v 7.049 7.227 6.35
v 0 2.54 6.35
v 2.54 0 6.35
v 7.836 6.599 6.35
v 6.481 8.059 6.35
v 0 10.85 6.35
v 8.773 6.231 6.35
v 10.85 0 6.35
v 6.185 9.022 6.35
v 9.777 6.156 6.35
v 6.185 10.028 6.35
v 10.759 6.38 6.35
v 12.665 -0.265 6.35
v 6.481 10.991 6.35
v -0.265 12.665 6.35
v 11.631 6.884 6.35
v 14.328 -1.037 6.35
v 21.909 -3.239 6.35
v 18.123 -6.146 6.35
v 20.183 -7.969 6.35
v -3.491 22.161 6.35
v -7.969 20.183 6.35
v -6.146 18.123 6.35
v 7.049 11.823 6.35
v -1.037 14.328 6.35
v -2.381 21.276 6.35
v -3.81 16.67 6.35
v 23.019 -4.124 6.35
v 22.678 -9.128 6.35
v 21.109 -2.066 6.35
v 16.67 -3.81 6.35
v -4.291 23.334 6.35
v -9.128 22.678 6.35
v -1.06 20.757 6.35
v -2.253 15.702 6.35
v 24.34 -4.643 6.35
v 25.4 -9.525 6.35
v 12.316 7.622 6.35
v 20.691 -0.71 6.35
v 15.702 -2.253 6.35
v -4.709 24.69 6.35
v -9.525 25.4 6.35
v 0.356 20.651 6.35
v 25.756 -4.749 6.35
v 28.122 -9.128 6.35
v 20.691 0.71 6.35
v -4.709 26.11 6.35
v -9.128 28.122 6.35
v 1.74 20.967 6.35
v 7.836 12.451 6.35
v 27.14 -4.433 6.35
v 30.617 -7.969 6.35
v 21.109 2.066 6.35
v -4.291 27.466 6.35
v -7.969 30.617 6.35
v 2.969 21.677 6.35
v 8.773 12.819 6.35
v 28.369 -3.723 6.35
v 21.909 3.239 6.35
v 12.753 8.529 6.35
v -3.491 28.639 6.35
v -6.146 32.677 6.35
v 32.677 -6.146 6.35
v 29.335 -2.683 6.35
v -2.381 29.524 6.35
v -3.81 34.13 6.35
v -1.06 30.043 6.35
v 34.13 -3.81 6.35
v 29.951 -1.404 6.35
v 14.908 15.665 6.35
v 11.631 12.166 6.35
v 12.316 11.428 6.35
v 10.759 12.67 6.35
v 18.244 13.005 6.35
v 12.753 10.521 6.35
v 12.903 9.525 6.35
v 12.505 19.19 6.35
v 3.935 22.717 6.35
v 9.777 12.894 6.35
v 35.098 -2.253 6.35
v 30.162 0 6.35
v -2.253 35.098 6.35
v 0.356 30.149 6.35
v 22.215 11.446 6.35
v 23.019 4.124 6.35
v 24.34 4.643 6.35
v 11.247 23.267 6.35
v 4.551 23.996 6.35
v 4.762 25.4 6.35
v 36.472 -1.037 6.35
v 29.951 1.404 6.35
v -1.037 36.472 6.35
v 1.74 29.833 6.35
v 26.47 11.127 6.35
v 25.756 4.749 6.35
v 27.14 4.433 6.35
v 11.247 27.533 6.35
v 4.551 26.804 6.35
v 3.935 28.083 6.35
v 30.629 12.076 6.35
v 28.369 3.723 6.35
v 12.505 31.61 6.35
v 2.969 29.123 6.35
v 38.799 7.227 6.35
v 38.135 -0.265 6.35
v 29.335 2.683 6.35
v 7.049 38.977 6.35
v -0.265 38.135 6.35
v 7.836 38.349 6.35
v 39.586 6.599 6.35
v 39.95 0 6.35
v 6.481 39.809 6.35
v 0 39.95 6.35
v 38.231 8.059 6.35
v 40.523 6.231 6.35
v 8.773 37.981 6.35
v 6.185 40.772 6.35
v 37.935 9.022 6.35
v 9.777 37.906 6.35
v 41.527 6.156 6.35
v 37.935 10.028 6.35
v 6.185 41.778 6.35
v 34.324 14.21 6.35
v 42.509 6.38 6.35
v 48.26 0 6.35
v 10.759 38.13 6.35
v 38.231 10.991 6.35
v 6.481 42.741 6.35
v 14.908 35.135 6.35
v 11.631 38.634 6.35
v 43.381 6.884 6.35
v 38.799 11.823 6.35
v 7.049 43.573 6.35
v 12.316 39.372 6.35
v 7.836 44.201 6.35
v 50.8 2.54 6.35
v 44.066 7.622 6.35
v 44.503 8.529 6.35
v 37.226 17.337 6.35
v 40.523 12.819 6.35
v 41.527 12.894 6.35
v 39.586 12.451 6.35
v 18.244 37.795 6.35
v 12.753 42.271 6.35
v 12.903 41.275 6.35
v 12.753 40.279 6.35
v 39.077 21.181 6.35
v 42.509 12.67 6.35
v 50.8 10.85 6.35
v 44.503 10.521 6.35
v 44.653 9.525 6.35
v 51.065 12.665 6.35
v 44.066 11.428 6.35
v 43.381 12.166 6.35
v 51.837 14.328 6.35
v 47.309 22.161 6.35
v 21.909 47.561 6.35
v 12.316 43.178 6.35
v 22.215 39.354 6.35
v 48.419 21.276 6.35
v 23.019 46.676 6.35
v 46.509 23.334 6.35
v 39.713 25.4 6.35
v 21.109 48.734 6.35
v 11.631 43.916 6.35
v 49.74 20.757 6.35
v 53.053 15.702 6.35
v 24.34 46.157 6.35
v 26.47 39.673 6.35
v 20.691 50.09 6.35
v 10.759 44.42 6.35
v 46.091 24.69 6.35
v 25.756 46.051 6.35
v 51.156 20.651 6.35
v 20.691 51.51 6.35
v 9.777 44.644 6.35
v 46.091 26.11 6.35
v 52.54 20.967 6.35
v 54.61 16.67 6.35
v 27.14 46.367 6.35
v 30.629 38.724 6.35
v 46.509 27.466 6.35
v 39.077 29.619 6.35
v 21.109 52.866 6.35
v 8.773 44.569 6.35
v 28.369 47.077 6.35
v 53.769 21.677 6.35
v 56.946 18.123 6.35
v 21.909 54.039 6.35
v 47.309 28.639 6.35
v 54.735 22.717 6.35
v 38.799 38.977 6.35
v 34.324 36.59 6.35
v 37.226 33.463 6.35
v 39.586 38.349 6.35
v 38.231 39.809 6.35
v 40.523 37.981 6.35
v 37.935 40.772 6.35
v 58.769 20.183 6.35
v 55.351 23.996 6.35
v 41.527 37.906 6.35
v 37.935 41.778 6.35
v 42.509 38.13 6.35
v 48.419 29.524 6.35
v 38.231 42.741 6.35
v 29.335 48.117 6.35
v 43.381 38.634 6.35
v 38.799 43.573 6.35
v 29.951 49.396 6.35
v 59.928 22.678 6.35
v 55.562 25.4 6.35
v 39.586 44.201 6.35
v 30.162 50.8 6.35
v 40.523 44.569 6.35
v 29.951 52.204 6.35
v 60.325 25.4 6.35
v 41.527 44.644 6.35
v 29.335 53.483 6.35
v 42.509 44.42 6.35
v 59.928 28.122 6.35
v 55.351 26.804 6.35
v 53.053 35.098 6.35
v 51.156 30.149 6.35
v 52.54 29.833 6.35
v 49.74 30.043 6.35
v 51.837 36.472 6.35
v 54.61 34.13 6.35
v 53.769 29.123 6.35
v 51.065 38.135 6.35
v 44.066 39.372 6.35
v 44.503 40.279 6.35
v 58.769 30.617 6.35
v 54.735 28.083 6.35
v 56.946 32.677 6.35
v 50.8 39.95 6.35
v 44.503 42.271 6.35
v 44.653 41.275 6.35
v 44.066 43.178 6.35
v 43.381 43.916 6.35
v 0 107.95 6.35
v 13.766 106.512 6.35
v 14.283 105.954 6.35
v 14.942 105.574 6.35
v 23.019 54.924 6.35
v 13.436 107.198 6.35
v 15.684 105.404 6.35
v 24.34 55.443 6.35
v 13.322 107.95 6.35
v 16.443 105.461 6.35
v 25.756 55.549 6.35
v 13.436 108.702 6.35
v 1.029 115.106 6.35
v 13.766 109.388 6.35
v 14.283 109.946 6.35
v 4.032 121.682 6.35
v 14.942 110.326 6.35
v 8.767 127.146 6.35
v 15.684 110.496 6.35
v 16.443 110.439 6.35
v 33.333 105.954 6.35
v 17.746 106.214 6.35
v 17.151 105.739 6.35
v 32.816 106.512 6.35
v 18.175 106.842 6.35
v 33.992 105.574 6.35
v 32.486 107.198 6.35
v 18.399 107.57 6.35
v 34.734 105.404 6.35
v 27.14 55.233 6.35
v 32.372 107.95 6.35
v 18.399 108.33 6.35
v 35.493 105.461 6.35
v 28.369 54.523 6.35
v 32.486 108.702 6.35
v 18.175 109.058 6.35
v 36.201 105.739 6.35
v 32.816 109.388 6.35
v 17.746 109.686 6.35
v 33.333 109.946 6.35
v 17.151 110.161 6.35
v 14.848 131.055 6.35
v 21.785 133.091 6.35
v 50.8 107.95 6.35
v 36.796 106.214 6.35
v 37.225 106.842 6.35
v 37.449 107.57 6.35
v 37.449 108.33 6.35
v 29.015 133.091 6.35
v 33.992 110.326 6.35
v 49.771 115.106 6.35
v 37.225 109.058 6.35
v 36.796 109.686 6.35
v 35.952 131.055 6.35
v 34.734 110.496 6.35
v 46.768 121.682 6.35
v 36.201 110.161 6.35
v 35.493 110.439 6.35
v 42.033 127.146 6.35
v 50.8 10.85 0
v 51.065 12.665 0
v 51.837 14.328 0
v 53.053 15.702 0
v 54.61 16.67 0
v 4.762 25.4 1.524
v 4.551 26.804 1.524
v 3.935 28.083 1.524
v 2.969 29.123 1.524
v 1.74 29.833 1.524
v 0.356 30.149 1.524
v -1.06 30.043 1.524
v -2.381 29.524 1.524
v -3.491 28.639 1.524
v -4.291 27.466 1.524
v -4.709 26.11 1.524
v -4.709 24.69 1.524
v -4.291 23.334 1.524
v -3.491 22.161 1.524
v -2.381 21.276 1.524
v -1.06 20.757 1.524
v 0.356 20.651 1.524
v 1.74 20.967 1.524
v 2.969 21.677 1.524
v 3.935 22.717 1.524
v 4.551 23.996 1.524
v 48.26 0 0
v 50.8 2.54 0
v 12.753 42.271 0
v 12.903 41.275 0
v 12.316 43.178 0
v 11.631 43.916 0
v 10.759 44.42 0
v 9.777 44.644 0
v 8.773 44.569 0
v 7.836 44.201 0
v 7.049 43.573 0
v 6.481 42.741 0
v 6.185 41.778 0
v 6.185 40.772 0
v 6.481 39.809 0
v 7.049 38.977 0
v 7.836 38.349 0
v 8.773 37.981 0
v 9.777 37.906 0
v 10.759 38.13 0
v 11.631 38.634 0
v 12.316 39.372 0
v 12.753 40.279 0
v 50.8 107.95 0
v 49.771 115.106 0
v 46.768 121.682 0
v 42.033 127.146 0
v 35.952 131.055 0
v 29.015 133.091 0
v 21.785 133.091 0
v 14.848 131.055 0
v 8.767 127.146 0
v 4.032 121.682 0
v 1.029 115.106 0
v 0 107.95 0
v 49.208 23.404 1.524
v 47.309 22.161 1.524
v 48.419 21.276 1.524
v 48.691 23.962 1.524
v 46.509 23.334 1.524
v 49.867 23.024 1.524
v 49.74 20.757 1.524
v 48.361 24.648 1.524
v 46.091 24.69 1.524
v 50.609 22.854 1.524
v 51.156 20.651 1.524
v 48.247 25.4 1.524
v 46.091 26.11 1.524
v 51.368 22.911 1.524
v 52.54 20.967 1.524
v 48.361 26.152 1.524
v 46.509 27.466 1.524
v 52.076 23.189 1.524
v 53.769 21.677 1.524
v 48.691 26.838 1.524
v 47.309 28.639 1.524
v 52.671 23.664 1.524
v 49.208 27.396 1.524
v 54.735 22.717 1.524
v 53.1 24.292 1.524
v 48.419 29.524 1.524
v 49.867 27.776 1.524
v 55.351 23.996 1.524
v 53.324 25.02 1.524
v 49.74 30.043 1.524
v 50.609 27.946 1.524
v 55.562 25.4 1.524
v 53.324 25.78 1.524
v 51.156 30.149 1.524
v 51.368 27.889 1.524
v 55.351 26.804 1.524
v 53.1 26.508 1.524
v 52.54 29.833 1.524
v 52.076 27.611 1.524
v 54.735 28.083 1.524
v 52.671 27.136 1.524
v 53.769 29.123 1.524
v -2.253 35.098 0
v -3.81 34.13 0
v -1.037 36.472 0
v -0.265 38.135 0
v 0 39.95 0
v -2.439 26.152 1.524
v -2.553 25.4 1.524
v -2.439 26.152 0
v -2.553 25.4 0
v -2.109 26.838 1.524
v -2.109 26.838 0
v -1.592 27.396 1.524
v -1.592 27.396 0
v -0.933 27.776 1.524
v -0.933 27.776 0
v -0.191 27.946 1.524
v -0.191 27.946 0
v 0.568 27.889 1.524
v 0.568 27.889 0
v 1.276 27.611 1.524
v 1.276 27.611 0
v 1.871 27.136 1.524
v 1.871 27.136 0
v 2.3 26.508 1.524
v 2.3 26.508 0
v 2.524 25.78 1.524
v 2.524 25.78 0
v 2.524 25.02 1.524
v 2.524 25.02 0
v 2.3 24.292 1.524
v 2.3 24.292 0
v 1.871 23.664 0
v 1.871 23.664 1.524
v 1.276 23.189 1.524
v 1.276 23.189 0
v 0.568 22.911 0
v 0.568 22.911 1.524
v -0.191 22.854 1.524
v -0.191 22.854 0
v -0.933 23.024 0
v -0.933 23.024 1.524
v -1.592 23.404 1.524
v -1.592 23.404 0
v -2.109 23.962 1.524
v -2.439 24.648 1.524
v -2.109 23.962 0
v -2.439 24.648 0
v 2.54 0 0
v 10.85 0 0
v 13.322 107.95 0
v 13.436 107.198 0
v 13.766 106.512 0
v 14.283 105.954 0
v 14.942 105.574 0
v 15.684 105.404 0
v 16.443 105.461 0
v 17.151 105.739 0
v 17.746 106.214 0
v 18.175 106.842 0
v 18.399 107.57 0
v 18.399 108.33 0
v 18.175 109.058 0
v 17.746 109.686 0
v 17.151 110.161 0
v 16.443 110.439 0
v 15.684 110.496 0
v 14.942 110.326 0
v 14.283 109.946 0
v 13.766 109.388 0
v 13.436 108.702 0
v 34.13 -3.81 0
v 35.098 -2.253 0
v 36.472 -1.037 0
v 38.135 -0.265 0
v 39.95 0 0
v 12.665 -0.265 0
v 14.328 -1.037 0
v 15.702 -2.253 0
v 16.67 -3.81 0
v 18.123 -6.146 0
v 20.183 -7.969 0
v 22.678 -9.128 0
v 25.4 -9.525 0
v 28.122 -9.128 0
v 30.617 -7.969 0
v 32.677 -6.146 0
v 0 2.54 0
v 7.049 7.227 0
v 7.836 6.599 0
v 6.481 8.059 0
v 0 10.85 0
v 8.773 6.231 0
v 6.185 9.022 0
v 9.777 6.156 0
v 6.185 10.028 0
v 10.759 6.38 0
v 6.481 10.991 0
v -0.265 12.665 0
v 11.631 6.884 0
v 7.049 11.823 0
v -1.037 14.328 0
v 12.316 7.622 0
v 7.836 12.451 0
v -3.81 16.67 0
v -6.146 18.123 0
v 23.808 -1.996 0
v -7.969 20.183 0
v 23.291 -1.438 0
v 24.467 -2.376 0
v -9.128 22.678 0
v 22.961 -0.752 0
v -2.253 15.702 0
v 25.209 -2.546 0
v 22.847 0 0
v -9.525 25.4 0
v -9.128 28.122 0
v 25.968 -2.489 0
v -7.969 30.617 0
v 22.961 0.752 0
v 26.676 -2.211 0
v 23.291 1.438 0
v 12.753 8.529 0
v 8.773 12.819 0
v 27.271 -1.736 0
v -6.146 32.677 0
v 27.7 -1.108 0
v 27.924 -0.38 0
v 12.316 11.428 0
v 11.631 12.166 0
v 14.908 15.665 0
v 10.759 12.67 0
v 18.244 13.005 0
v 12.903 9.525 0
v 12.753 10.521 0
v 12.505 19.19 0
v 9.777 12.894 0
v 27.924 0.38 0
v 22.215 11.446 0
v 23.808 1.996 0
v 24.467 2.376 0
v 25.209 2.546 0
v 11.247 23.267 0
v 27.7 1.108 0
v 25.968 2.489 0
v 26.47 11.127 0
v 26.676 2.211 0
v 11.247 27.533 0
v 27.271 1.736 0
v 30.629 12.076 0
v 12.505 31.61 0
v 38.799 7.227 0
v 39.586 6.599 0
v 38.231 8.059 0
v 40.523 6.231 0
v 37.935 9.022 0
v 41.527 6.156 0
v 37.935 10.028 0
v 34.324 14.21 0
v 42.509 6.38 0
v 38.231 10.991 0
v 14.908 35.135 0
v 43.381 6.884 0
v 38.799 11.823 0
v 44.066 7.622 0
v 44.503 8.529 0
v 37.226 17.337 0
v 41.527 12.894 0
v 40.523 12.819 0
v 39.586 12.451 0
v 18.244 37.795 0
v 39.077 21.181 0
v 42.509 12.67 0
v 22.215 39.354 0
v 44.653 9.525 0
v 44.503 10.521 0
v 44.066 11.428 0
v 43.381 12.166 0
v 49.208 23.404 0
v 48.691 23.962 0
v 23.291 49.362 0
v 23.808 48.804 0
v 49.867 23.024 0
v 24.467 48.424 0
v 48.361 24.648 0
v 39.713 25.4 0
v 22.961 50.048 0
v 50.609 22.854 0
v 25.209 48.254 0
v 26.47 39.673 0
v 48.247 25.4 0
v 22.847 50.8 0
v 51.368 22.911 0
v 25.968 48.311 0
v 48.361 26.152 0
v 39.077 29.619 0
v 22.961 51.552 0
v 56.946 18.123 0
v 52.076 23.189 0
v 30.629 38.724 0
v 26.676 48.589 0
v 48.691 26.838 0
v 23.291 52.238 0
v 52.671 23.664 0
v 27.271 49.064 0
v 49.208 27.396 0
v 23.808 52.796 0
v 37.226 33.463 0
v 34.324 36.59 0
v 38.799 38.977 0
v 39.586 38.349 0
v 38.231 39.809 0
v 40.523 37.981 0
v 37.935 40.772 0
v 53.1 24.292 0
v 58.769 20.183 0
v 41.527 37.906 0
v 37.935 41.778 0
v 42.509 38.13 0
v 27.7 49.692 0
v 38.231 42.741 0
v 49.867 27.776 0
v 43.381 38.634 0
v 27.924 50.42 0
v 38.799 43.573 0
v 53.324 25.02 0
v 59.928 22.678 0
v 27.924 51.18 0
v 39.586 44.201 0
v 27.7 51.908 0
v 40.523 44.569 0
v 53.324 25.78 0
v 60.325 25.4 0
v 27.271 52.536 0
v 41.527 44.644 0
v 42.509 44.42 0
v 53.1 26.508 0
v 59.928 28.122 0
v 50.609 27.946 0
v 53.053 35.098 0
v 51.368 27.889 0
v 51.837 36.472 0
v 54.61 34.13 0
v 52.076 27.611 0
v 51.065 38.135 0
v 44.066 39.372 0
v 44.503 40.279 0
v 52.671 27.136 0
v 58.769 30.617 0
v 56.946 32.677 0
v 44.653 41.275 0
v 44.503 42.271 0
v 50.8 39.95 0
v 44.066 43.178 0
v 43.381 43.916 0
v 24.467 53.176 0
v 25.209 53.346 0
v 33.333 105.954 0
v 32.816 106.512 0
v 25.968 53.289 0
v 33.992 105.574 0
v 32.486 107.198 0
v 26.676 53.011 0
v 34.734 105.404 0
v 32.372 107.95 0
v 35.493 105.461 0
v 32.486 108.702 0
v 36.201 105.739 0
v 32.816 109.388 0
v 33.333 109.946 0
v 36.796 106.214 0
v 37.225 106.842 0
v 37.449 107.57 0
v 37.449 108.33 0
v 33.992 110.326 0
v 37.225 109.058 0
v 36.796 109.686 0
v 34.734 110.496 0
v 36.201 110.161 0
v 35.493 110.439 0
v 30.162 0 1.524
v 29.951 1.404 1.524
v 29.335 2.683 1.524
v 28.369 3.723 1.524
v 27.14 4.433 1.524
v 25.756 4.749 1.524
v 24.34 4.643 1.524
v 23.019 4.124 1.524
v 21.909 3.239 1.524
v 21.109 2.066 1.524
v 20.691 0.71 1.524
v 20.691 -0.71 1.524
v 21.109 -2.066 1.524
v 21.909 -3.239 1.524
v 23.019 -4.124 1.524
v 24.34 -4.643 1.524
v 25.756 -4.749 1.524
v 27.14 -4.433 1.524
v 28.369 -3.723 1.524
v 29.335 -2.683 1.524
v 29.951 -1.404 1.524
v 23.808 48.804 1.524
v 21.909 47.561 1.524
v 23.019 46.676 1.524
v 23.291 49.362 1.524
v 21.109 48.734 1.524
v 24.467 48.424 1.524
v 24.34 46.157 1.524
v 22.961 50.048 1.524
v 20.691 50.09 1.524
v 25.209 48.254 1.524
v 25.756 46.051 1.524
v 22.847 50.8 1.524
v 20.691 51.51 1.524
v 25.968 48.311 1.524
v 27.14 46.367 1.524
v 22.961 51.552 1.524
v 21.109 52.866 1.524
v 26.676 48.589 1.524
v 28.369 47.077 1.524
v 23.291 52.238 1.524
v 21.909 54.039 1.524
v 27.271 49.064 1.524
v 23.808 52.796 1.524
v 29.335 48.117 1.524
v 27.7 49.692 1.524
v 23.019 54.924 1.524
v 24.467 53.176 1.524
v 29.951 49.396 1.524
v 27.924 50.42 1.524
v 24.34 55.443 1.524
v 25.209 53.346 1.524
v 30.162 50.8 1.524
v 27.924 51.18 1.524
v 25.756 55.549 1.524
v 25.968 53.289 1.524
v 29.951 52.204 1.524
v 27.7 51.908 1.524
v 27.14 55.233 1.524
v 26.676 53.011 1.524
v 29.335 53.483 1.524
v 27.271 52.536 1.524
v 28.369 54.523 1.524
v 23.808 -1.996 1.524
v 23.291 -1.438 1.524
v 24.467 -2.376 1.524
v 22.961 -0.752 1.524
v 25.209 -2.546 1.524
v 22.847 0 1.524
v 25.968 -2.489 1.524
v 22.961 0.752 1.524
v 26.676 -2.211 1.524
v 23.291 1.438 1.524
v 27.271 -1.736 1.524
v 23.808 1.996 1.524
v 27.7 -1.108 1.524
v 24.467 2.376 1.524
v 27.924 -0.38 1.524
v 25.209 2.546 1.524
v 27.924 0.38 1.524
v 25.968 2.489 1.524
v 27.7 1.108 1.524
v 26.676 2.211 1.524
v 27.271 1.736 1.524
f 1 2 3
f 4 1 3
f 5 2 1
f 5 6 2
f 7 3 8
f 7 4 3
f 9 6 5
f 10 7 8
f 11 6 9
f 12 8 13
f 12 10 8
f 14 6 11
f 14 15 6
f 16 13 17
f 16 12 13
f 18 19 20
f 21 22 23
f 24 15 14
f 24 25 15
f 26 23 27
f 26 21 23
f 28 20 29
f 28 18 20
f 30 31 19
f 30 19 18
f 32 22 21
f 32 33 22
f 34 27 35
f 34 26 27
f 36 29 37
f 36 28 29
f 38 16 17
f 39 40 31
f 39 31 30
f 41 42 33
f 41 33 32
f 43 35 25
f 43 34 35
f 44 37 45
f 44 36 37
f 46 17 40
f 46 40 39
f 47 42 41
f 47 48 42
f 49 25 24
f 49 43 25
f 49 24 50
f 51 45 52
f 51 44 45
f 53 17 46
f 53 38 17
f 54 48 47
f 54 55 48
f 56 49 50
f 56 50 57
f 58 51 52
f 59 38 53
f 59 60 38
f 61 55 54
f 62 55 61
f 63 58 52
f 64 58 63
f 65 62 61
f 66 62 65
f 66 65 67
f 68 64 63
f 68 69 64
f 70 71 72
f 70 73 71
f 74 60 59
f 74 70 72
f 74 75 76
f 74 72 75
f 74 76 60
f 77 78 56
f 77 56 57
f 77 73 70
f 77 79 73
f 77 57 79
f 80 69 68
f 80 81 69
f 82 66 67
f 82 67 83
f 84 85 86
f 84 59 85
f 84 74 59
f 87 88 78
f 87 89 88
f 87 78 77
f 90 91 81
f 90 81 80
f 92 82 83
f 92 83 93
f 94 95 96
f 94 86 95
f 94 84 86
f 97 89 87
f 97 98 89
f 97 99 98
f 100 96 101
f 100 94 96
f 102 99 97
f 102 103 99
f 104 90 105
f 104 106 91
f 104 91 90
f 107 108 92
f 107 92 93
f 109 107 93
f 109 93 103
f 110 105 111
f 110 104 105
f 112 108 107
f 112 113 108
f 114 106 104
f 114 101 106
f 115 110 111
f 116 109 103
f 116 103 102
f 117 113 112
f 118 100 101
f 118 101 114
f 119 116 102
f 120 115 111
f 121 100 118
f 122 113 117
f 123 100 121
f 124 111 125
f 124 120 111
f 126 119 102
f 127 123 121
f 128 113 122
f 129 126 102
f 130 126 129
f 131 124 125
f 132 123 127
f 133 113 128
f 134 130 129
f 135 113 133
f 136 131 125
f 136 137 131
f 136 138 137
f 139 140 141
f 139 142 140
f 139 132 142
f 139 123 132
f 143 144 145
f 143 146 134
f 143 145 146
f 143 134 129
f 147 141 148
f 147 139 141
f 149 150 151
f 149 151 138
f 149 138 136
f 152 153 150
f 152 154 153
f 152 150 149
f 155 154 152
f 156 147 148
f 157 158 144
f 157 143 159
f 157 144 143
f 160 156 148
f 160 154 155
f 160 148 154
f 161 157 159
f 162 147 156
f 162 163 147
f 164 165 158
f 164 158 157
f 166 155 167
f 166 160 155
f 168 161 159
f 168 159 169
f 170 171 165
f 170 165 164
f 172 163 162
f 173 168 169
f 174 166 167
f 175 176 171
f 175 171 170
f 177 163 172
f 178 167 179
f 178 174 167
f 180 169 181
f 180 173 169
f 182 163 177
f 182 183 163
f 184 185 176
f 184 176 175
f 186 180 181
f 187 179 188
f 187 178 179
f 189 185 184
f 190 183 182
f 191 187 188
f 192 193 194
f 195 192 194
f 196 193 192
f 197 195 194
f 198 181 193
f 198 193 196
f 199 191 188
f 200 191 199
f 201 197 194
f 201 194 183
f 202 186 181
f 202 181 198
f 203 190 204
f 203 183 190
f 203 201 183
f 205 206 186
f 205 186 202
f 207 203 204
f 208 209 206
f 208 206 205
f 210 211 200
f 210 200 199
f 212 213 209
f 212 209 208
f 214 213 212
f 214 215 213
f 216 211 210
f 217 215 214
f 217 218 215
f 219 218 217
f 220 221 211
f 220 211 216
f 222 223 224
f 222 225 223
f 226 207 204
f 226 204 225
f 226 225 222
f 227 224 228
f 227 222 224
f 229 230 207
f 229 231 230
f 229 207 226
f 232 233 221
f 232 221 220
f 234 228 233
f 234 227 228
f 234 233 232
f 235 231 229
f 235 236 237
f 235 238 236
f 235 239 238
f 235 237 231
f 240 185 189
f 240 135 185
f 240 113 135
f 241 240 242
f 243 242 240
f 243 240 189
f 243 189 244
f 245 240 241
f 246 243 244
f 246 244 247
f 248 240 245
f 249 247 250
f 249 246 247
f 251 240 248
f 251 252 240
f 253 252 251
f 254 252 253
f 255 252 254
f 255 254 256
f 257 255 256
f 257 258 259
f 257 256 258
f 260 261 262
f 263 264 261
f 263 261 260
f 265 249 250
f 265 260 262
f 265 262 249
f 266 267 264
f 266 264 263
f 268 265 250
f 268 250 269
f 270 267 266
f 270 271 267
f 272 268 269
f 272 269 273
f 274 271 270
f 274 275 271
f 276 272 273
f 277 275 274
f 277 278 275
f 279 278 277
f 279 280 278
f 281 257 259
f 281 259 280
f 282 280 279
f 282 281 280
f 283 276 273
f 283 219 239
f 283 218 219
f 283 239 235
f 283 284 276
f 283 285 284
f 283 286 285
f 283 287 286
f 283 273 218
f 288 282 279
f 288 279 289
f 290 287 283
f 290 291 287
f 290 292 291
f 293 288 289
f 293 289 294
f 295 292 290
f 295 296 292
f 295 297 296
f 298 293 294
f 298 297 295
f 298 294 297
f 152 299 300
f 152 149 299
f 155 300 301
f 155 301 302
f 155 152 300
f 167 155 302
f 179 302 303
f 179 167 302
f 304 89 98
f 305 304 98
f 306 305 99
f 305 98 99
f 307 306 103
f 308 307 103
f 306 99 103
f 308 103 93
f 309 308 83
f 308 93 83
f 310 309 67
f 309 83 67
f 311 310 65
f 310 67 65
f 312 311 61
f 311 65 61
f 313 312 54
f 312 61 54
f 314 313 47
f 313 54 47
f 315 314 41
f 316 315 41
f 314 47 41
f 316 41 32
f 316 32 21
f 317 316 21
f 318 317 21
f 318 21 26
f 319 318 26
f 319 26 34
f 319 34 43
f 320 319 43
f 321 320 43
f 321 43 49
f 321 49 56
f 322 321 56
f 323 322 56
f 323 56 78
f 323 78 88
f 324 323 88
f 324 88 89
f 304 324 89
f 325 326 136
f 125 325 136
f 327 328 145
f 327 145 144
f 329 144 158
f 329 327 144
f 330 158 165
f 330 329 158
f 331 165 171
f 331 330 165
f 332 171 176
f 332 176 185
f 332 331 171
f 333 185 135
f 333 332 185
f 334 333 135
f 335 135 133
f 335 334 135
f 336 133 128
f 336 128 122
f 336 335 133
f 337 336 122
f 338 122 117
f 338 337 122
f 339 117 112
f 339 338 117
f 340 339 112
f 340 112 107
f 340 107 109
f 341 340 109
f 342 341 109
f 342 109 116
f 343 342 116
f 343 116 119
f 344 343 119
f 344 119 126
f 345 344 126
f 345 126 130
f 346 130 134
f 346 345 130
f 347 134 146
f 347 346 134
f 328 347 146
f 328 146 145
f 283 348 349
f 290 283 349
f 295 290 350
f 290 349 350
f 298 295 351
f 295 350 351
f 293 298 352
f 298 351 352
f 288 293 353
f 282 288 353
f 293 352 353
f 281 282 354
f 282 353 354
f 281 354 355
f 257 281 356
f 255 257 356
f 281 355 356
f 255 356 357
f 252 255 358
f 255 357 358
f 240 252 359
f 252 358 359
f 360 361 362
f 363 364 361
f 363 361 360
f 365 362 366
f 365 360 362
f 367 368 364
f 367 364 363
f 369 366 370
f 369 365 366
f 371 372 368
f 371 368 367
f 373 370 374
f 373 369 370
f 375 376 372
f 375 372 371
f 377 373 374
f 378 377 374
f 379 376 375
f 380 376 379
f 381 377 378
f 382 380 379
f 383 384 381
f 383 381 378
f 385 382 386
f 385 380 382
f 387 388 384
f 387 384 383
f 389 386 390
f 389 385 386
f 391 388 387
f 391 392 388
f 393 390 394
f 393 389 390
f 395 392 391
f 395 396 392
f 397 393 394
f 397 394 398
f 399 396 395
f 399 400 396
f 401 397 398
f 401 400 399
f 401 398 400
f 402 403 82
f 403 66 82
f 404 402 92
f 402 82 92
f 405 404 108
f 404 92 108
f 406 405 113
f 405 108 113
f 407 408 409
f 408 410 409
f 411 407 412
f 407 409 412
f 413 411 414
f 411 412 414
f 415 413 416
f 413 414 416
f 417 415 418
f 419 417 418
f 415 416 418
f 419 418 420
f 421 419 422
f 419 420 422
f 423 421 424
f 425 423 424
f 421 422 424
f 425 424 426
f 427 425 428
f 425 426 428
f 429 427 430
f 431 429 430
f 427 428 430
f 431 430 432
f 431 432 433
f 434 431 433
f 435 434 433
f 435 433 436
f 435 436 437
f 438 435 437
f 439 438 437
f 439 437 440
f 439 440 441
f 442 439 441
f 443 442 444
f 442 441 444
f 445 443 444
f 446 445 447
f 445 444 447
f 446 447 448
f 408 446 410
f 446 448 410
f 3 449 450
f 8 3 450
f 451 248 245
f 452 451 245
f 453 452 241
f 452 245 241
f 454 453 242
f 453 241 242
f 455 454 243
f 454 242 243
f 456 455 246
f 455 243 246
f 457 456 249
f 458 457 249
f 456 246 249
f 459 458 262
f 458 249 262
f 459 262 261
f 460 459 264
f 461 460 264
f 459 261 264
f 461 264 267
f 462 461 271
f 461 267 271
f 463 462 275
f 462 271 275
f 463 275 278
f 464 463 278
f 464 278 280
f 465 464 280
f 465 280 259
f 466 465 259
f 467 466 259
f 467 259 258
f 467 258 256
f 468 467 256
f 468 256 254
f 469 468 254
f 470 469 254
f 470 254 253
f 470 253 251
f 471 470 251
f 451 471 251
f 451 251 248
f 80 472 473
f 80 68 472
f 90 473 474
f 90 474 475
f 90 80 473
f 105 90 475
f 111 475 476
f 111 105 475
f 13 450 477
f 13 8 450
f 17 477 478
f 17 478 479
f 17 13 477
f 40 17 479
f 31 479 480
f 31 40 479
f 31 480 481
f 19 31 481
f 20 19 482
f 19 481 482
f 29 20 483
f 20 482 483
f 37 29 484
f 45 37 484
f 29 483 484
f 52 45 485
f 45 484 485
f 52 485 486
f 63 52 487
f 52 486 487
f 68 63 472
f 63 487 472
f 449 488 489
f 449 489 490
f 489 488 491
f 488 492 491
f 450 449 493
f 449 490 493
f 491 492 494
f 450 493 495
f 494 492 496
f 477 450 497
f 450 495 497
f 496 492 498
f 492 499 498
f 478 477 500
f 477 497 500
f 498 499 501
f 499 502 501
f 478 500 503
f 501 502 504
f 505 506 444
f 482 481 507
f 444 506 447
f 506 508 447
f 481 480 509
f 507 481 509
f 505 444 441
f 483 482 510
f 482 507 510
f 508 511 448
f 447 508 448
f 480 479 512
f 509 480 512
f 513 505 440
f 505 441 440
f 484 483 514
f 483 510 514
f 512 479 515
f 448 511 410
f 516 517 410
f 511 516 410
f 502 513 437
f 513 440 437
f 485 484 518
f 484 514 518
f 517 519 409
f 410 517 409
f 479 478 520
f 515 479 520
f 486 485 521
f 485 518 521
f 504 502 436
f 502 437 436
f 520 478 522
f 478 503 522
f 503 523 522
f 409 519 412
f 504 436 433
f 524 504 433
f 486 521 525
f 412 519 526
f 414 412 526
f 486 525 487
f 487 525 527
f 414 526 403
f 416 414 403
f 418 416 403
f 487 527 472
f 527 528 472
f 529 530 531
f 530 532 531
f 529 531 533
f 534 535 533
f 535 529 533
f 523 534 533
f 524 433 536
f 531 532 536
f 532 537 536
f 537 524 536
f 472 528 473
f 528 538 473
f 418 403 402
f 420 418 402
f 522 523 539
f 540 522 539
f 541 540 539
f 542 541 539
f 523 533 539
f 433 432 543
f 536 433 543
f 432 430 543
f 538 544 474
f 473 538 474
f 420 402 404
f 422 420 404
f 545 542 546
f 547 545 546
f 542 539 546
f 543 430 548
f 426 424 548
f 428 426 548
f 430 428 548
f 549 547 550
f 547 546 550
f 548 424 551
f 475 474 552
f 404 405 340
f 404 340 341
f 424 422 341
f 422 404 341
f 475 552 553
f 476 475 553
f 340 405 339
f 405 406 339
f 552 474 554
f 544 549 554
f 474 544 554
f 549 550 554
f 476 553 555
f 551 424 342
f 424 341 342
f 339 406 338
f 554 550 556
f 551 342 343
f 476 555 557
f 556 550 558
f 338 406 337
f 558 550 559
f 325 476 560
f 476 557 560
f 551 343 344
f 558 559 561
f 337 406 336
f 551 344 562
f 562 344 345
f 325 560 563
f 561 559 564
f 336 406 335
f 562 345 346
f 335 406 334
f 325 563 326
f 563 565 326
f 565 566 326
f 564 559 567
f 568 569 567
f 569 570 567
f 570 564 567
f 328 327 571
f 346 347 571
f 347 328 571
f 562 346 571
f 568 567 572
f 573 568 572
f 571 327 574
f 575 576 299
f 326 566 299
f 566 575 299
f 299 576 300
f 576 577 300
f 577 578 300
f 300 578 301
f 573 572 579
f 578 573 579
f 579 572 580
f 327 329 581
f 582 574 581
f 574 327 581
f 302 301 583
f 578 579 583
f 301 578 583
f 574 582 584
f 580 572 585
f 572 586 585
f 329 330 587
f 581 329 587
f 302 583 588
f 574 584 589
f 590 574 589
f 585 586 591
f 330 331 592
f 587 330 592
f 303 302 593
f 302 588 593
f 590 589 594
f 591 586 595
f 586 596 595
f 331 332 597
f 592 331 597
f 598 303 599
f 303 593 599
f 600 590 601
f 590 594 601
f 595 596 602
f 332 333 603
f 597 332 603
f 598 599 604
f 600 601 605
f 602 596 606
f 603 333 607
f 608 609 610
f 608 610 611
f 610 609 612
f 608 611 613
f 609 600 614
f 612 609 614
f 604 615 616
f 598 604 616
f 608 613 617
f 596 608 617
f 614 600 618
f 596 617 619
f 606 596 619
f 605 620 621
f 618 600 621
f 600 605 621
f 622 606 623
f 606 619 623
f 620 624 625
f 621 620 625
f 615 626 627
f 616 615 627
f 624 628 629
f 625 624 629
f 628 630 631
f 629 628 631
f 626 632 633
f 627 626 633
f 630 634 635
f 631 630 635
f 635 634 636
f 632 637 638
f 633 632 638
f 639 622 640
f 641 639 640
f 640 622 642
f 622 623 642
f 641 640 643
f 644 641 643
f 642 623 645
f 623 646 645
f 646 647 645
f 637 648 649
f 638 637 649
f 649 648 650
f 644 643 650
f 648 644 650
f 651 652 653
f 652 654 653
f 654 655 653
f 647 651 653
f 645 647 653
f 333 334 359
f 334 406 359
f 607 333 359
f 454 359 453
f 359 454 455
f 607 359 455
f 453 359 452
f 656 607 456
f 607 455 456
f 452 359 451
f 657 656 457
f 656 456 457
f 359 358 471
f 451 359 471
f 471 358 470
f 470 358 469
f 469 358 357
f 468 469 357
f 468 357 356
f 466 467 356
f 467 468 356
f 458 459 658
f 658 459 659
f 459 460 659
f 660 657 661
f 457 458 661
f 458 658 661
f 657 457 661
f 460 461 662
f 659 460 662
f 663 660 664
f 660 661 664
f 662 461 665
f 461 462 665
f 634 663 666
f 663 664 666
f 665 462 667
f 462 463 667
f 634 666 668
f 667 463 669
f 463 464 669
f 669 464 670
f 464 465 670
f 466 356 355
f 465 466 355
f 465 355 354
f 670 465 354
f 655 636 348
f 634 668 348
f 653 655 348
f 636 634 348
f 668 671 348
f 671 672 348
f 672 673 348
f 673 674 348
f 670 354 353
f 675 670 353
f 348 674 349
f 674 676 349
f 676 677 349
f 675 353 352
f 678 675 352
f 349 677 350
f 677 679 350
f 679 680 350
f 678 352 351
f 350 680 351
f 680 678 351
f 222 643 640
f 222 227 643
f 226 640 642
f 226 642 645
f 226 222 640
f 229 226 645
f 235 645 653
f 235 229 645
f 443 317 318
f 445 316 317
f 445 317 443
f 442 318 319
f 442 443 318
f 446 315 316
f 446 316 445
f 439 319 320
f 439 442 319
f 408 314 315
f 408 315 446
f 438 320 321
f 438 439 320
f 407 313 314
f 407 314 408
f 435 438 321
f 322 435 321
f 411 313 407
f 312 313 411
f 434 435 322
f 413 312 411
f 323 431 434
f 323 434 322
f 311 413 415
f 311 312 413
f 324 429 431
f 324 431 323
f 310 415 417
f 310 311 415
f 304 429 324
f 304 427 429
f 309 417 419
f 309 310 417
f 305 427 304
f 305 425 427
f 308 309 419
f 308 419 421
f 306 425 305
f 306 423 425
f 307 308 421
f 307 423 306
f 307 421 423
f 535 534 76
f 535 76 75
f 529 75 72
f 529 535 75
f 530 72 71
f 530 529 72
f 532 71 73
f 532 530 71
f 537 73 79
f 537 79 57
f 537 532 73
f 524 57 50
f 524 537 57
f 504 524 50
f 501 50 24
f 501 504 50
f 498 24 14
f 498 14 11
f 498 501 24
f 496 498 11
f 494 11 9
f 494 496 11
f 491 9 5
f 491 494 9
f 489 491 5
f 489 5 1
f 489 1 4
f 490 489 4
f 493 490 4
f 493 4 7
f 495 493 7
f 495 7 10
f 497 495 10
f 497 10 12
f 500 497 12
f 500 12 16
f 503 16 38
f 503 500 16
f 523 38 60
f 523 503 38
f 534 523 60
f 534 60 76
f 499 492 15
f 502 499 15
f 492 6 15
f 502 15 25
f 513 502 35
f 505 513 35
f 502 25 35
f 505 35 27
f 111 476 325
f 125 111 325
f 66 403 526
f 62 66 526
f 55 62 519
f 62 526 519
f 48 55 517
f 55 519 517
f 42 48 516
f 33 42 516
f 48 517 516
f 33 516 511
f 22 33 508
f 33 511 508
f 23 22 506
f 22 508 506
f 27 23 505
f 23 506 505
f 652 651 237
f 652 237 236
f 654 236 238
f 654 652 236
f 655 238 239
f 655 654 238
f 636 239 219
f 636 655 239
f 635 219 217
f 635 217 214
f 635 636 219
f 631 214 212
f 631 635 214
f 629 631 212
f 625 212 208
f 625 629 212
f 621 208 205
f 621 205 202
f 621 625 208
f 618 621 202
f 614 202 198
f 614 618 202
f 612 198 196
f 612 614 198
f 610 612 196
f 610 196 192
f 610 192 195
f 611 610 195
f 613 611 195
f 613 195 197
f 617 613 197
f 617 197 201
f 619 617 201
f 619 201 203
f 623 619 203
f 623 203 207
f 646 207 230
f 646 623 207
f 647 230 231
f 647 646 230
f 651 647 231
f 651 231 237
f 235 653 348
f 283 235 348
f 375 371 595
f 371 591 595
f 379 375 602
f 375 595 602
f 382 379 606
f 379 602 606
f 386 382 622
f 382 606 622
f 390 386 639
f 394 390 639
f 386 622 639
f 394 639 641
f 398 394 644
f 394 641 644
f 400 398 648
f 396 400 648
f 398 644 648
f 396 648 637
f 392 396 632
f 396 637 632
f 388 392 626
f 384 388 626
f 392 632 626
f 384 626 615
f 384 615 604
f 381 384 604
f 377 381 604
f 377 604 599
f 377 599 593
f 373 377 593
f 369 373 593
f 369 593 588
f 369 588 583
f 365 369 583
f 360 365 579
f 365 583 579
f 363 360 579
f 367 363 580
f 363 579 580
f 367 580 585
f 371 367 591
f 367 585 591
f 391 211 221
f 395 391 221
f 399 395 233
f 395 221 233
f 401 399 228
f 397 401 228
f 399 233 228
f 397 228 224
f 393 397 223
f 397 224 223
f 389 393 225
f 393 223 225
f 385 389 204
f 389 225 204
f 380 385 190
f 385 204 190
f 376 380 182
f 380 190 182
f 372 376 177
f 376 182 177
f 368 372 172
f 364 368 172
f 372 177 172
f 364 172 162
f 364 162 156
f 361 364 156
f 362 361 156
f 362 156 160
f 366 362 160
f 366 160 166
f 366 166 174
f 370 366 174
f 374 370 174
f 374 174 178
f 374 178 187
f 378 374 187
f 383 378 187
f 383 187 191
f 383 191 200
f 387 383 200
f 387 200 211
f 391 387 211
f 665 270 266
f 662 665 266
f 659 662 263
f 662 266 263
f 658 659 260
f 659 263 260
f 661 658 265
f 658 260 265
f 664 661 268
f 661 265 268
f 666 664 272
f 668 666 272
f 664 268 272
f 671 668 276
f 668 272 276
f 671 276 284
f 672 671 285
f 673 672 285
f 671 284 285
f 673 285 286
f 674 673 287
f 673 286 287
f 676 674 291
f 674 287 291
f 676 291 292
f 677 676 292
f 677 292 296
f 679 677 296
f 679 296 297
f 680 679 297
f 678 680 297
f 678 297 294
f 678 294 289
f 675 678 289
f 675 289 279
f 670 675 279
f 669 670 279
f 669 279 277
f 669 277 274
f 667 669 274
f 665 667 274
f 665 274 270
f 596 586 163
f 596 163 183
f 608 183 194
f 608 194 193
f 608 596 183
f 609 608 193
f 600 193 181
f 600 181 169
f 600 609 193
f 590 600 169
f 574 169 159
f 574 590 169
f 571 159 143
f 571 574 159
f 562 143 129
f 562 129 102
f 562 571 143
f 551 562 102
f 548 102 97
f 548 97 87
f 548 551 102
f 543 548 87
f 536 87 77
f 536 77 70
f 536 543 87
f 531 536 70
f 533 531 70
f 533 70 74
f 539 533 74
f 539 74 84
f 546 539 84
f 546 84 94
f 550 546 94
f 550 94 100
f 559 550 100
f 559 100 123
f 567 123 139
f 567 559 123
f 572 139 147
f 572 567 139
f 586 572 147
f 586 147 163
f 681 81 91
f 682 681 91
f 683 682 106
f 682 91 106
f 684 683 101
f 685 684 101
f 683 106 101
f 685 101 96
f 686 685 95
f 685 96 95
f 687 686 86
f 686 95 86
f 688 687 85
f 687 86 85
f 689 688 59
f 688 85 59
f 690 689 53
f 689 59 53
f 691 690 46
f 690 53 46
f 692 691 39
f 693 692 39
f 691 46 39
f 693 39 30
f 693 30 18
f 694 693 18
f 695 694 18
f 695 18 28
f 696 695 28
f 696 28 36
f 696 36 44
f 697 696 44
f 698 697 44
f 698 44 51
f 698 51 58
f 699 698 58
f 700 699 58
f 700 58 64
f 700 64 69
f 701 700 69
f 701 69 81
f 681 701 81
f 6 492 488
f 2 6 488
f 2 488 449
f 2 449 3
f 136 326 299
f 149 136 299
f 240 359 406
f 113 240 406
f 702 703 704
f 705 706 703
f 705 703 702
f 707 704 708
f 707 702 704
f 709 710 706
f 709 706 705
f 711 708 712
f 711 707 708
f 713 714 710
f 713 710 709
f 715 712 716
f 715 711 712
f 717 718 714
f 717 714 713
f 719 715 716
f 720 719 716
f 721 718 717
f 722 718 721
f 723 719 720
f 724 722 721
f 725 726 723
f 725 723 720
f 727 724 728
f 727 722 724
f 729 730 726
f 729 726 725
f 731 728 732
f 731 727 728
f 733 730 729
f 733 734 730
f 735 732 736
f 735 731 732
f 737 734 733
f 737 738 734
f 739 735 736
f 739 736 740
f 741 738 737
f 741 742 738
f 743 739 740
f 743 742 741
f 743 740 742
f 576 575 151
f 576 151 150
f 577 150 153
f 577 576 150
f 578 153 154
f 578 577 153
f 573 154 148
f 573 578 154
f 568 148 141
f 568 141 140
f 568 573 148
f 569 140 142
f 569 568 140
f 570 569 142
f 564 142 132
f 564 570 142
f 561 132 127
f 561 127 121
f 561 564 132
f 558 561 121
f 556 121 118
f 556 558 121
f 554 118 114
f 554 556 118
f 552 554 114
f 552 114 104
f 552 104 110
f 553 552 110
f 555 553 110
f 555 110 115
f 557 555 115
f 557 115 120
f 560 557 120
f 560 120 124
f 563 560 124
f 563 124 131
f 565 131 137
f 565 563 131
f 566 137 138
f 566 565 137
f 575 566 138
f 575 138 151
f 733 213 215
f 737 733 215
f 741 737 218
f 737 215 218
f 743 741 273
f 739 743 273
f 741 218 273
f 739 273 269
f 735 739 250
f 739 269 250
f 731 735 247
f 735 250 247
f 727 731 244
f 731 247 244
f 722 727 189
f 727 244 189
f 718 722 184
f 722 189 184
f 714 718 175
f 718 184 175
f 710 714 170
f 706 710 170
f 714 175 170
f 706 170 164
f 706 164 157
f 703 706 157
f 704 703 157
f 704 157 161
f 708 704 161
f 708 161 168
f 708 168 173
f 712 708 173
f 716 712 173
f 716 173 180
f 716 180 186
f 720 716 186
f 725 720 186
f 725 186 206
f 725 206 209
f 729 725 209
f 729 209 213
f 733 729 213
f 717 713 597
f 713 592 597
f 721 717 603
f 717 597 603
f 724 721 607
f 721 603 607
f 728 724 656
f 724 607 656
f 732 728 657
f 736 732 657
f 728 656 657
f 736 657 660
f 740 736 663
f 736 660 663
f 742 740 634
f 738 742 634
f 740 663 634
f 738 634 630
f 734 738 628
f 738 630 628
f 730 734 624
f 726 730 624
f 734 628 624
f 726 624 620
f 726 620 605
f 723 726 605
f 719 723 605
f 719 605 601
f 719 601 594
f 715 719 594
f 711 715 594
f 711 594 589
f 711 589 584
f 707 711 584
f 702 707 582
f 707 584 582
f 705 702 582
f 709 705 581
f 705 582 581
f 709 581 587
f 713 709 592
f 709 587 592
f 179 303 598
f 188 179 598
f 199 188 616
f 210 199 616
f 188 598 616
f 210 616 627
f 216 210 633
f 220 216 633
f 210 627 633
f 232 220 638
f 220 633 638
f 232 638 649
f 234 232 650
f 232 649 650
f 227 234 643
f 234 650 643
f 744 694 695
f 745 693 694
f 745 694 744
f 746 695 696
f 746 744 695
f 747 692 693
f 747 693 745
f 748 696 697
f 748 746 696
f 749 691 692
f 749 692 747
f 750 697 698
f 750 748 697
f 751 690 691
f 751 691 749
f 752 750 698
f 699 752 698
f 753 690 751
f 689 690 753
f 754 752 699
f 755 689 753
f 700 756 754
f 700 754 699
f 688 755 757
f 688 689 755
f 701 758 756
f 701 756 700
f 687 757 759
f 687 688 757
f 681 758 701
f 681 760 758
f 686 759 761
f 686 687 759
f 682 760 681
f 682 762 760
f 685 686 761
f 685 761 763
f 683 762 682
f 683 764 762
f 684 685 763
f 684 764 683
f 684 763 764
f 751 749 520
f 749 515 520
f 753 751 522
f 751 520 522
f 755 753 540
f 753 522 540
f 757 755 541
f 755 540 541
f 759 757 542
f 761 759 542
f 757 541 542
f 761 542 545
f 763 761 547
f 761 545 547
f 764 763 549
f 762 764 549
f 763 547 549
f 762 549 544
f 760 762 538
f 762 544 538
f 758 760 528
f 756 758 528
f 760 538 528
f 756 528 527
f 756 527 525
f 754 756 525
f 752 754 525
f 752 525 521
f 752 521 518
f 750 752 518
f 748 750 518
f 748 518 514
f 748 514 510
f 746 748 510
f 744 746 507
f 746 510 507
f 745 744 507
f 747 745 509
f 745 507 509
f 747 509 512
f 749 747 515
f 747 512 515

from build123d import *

# Parameters (mm, degrees)
SKETCH1_R                                       = 3.3782
SKETCH1_R_2                                     = 14.3129
BOSS_EXTRUDE1_DEPTH                             = 6.35
CBORE_FOR_10_SOCKET_HEAD_CAP_SCREW1_D           = 5.1054
CBORE_FOR_10_SOCKET_HEAD_CAP_SCREW1_CBORE_D     = 9.525
CBORE_FOR_10_SOCKET_HEAD_CAP_SCREW1_CBORE_DEPTH = 4.826
F_1_4_20_TAPPED_HOLE2_D                         = 5.1054
FILLET1_R                                       = 6.35
CHAMFER1_SIZE                                   = 2.54


with BuildPart() as part:
    # Sketch1 → Boss-Extrude1 (new body)
    with BuildSketch(Plane.XY):
        with BuildLine():
            Line((0, 0), (15.875, 0))
            ThreePointArc((15.875, 0), (25.4, -9.525), (34.925, 0))
            Line((34.925, 0), (50.8, 0))
            Line((50.8, 0), (50.8, 15.875))
            ThreePointArc((50.8, 15.875), (60.325, 25.4), (50.8, 34.925))
            Line((50.8, 34.925), (50.8, 107.95))
            ThreePointArc((50.8, 107.95), (25.4, 133.35), (0, 107.95))
            Line((0, 107.95), (0, 34.925))
            ThreePointArc((0, 34.925), (-9.525, 25.4), (0, 15.875))
            Line((0, 15.875), (0, 0))
        make_face()
        with Locations((41.275, 9.525)):
            Circle(SKETCH1_R, mode=Mode.SUBTRACT)
        with Locations((9.525, 9.525)):
            Circle(SKETCH1_R, mode=Mode.SUBTRACT)
        with Locations((9.525, 41.275)):
            Circle(SKETCH1_R, mode=Mode.SUBTRACT)
        with Locations((41.275, 41.275)):
            Circle(SKETCH1_R, mode=Mode.SUBTRACT)
        with Locations((25.4, 25.4)):
            Circle(SKETCH1_R_2, mode=Mode.SUBTRACT)
    extrude(amount=BOSS_EXTRUDE1_DEPTH)

    # CBORE for #10 Socket Head Cap Screw1 (through all)
    with Locations(Plane.XY.offset(6.35)):
        with Locations((0, 25.4), (50.8, 25.4), (25.4, 0), (25.4, 50.8)):
            CounterBoreHole(CBORE_FOR_10_SOCKET_HEAD_CAP_SCREW1_D / 2, CBORE_FOR_10_SOCKET_HEAD_CAP_SCREW1_CBORE_D / 2, CBORE_FOR_10_SOCKET_HEAD_CAP_SCREW1_CBORE_DEPTH)

    # 1/4-20 Tapped Hole2 (through all)
    with Locations(Plane(origin=(0, 0, 0), x_dir=(1, 0, 0), z_dir=(0, 0, -1))):
        with Locations((15.875, -107.95), (34.925, -107.95)):
            Hole(F_1_4_20_TAPPED_HOLE2_D / 2)

    # Fillet1
    fillet1_edges = [part.edges().sort_by_distance(p)[0] for p in [
        (0, 15.875, 3.175),
        (0, 34.925, 3.175),
        (50.8, 34.925, 3.175),
        (50.8, 15.875, 3.175),
        (34.925, 0, 3.175),
        (15.875, 0, 3.175),
    ]]
    fillet(fillet1_edges, radius=FILLET1_R)

    # Chamfer1
    chamfer1_edges = [part.edges().sort_by_distance(p)[0] for p in [
        (50.8, 0, 3.175),
        (0, 0, 3.175),
    ]]
    chamfer(chamfer1_edges, length=CHAMFER1_SIZE)


solid = part.part
